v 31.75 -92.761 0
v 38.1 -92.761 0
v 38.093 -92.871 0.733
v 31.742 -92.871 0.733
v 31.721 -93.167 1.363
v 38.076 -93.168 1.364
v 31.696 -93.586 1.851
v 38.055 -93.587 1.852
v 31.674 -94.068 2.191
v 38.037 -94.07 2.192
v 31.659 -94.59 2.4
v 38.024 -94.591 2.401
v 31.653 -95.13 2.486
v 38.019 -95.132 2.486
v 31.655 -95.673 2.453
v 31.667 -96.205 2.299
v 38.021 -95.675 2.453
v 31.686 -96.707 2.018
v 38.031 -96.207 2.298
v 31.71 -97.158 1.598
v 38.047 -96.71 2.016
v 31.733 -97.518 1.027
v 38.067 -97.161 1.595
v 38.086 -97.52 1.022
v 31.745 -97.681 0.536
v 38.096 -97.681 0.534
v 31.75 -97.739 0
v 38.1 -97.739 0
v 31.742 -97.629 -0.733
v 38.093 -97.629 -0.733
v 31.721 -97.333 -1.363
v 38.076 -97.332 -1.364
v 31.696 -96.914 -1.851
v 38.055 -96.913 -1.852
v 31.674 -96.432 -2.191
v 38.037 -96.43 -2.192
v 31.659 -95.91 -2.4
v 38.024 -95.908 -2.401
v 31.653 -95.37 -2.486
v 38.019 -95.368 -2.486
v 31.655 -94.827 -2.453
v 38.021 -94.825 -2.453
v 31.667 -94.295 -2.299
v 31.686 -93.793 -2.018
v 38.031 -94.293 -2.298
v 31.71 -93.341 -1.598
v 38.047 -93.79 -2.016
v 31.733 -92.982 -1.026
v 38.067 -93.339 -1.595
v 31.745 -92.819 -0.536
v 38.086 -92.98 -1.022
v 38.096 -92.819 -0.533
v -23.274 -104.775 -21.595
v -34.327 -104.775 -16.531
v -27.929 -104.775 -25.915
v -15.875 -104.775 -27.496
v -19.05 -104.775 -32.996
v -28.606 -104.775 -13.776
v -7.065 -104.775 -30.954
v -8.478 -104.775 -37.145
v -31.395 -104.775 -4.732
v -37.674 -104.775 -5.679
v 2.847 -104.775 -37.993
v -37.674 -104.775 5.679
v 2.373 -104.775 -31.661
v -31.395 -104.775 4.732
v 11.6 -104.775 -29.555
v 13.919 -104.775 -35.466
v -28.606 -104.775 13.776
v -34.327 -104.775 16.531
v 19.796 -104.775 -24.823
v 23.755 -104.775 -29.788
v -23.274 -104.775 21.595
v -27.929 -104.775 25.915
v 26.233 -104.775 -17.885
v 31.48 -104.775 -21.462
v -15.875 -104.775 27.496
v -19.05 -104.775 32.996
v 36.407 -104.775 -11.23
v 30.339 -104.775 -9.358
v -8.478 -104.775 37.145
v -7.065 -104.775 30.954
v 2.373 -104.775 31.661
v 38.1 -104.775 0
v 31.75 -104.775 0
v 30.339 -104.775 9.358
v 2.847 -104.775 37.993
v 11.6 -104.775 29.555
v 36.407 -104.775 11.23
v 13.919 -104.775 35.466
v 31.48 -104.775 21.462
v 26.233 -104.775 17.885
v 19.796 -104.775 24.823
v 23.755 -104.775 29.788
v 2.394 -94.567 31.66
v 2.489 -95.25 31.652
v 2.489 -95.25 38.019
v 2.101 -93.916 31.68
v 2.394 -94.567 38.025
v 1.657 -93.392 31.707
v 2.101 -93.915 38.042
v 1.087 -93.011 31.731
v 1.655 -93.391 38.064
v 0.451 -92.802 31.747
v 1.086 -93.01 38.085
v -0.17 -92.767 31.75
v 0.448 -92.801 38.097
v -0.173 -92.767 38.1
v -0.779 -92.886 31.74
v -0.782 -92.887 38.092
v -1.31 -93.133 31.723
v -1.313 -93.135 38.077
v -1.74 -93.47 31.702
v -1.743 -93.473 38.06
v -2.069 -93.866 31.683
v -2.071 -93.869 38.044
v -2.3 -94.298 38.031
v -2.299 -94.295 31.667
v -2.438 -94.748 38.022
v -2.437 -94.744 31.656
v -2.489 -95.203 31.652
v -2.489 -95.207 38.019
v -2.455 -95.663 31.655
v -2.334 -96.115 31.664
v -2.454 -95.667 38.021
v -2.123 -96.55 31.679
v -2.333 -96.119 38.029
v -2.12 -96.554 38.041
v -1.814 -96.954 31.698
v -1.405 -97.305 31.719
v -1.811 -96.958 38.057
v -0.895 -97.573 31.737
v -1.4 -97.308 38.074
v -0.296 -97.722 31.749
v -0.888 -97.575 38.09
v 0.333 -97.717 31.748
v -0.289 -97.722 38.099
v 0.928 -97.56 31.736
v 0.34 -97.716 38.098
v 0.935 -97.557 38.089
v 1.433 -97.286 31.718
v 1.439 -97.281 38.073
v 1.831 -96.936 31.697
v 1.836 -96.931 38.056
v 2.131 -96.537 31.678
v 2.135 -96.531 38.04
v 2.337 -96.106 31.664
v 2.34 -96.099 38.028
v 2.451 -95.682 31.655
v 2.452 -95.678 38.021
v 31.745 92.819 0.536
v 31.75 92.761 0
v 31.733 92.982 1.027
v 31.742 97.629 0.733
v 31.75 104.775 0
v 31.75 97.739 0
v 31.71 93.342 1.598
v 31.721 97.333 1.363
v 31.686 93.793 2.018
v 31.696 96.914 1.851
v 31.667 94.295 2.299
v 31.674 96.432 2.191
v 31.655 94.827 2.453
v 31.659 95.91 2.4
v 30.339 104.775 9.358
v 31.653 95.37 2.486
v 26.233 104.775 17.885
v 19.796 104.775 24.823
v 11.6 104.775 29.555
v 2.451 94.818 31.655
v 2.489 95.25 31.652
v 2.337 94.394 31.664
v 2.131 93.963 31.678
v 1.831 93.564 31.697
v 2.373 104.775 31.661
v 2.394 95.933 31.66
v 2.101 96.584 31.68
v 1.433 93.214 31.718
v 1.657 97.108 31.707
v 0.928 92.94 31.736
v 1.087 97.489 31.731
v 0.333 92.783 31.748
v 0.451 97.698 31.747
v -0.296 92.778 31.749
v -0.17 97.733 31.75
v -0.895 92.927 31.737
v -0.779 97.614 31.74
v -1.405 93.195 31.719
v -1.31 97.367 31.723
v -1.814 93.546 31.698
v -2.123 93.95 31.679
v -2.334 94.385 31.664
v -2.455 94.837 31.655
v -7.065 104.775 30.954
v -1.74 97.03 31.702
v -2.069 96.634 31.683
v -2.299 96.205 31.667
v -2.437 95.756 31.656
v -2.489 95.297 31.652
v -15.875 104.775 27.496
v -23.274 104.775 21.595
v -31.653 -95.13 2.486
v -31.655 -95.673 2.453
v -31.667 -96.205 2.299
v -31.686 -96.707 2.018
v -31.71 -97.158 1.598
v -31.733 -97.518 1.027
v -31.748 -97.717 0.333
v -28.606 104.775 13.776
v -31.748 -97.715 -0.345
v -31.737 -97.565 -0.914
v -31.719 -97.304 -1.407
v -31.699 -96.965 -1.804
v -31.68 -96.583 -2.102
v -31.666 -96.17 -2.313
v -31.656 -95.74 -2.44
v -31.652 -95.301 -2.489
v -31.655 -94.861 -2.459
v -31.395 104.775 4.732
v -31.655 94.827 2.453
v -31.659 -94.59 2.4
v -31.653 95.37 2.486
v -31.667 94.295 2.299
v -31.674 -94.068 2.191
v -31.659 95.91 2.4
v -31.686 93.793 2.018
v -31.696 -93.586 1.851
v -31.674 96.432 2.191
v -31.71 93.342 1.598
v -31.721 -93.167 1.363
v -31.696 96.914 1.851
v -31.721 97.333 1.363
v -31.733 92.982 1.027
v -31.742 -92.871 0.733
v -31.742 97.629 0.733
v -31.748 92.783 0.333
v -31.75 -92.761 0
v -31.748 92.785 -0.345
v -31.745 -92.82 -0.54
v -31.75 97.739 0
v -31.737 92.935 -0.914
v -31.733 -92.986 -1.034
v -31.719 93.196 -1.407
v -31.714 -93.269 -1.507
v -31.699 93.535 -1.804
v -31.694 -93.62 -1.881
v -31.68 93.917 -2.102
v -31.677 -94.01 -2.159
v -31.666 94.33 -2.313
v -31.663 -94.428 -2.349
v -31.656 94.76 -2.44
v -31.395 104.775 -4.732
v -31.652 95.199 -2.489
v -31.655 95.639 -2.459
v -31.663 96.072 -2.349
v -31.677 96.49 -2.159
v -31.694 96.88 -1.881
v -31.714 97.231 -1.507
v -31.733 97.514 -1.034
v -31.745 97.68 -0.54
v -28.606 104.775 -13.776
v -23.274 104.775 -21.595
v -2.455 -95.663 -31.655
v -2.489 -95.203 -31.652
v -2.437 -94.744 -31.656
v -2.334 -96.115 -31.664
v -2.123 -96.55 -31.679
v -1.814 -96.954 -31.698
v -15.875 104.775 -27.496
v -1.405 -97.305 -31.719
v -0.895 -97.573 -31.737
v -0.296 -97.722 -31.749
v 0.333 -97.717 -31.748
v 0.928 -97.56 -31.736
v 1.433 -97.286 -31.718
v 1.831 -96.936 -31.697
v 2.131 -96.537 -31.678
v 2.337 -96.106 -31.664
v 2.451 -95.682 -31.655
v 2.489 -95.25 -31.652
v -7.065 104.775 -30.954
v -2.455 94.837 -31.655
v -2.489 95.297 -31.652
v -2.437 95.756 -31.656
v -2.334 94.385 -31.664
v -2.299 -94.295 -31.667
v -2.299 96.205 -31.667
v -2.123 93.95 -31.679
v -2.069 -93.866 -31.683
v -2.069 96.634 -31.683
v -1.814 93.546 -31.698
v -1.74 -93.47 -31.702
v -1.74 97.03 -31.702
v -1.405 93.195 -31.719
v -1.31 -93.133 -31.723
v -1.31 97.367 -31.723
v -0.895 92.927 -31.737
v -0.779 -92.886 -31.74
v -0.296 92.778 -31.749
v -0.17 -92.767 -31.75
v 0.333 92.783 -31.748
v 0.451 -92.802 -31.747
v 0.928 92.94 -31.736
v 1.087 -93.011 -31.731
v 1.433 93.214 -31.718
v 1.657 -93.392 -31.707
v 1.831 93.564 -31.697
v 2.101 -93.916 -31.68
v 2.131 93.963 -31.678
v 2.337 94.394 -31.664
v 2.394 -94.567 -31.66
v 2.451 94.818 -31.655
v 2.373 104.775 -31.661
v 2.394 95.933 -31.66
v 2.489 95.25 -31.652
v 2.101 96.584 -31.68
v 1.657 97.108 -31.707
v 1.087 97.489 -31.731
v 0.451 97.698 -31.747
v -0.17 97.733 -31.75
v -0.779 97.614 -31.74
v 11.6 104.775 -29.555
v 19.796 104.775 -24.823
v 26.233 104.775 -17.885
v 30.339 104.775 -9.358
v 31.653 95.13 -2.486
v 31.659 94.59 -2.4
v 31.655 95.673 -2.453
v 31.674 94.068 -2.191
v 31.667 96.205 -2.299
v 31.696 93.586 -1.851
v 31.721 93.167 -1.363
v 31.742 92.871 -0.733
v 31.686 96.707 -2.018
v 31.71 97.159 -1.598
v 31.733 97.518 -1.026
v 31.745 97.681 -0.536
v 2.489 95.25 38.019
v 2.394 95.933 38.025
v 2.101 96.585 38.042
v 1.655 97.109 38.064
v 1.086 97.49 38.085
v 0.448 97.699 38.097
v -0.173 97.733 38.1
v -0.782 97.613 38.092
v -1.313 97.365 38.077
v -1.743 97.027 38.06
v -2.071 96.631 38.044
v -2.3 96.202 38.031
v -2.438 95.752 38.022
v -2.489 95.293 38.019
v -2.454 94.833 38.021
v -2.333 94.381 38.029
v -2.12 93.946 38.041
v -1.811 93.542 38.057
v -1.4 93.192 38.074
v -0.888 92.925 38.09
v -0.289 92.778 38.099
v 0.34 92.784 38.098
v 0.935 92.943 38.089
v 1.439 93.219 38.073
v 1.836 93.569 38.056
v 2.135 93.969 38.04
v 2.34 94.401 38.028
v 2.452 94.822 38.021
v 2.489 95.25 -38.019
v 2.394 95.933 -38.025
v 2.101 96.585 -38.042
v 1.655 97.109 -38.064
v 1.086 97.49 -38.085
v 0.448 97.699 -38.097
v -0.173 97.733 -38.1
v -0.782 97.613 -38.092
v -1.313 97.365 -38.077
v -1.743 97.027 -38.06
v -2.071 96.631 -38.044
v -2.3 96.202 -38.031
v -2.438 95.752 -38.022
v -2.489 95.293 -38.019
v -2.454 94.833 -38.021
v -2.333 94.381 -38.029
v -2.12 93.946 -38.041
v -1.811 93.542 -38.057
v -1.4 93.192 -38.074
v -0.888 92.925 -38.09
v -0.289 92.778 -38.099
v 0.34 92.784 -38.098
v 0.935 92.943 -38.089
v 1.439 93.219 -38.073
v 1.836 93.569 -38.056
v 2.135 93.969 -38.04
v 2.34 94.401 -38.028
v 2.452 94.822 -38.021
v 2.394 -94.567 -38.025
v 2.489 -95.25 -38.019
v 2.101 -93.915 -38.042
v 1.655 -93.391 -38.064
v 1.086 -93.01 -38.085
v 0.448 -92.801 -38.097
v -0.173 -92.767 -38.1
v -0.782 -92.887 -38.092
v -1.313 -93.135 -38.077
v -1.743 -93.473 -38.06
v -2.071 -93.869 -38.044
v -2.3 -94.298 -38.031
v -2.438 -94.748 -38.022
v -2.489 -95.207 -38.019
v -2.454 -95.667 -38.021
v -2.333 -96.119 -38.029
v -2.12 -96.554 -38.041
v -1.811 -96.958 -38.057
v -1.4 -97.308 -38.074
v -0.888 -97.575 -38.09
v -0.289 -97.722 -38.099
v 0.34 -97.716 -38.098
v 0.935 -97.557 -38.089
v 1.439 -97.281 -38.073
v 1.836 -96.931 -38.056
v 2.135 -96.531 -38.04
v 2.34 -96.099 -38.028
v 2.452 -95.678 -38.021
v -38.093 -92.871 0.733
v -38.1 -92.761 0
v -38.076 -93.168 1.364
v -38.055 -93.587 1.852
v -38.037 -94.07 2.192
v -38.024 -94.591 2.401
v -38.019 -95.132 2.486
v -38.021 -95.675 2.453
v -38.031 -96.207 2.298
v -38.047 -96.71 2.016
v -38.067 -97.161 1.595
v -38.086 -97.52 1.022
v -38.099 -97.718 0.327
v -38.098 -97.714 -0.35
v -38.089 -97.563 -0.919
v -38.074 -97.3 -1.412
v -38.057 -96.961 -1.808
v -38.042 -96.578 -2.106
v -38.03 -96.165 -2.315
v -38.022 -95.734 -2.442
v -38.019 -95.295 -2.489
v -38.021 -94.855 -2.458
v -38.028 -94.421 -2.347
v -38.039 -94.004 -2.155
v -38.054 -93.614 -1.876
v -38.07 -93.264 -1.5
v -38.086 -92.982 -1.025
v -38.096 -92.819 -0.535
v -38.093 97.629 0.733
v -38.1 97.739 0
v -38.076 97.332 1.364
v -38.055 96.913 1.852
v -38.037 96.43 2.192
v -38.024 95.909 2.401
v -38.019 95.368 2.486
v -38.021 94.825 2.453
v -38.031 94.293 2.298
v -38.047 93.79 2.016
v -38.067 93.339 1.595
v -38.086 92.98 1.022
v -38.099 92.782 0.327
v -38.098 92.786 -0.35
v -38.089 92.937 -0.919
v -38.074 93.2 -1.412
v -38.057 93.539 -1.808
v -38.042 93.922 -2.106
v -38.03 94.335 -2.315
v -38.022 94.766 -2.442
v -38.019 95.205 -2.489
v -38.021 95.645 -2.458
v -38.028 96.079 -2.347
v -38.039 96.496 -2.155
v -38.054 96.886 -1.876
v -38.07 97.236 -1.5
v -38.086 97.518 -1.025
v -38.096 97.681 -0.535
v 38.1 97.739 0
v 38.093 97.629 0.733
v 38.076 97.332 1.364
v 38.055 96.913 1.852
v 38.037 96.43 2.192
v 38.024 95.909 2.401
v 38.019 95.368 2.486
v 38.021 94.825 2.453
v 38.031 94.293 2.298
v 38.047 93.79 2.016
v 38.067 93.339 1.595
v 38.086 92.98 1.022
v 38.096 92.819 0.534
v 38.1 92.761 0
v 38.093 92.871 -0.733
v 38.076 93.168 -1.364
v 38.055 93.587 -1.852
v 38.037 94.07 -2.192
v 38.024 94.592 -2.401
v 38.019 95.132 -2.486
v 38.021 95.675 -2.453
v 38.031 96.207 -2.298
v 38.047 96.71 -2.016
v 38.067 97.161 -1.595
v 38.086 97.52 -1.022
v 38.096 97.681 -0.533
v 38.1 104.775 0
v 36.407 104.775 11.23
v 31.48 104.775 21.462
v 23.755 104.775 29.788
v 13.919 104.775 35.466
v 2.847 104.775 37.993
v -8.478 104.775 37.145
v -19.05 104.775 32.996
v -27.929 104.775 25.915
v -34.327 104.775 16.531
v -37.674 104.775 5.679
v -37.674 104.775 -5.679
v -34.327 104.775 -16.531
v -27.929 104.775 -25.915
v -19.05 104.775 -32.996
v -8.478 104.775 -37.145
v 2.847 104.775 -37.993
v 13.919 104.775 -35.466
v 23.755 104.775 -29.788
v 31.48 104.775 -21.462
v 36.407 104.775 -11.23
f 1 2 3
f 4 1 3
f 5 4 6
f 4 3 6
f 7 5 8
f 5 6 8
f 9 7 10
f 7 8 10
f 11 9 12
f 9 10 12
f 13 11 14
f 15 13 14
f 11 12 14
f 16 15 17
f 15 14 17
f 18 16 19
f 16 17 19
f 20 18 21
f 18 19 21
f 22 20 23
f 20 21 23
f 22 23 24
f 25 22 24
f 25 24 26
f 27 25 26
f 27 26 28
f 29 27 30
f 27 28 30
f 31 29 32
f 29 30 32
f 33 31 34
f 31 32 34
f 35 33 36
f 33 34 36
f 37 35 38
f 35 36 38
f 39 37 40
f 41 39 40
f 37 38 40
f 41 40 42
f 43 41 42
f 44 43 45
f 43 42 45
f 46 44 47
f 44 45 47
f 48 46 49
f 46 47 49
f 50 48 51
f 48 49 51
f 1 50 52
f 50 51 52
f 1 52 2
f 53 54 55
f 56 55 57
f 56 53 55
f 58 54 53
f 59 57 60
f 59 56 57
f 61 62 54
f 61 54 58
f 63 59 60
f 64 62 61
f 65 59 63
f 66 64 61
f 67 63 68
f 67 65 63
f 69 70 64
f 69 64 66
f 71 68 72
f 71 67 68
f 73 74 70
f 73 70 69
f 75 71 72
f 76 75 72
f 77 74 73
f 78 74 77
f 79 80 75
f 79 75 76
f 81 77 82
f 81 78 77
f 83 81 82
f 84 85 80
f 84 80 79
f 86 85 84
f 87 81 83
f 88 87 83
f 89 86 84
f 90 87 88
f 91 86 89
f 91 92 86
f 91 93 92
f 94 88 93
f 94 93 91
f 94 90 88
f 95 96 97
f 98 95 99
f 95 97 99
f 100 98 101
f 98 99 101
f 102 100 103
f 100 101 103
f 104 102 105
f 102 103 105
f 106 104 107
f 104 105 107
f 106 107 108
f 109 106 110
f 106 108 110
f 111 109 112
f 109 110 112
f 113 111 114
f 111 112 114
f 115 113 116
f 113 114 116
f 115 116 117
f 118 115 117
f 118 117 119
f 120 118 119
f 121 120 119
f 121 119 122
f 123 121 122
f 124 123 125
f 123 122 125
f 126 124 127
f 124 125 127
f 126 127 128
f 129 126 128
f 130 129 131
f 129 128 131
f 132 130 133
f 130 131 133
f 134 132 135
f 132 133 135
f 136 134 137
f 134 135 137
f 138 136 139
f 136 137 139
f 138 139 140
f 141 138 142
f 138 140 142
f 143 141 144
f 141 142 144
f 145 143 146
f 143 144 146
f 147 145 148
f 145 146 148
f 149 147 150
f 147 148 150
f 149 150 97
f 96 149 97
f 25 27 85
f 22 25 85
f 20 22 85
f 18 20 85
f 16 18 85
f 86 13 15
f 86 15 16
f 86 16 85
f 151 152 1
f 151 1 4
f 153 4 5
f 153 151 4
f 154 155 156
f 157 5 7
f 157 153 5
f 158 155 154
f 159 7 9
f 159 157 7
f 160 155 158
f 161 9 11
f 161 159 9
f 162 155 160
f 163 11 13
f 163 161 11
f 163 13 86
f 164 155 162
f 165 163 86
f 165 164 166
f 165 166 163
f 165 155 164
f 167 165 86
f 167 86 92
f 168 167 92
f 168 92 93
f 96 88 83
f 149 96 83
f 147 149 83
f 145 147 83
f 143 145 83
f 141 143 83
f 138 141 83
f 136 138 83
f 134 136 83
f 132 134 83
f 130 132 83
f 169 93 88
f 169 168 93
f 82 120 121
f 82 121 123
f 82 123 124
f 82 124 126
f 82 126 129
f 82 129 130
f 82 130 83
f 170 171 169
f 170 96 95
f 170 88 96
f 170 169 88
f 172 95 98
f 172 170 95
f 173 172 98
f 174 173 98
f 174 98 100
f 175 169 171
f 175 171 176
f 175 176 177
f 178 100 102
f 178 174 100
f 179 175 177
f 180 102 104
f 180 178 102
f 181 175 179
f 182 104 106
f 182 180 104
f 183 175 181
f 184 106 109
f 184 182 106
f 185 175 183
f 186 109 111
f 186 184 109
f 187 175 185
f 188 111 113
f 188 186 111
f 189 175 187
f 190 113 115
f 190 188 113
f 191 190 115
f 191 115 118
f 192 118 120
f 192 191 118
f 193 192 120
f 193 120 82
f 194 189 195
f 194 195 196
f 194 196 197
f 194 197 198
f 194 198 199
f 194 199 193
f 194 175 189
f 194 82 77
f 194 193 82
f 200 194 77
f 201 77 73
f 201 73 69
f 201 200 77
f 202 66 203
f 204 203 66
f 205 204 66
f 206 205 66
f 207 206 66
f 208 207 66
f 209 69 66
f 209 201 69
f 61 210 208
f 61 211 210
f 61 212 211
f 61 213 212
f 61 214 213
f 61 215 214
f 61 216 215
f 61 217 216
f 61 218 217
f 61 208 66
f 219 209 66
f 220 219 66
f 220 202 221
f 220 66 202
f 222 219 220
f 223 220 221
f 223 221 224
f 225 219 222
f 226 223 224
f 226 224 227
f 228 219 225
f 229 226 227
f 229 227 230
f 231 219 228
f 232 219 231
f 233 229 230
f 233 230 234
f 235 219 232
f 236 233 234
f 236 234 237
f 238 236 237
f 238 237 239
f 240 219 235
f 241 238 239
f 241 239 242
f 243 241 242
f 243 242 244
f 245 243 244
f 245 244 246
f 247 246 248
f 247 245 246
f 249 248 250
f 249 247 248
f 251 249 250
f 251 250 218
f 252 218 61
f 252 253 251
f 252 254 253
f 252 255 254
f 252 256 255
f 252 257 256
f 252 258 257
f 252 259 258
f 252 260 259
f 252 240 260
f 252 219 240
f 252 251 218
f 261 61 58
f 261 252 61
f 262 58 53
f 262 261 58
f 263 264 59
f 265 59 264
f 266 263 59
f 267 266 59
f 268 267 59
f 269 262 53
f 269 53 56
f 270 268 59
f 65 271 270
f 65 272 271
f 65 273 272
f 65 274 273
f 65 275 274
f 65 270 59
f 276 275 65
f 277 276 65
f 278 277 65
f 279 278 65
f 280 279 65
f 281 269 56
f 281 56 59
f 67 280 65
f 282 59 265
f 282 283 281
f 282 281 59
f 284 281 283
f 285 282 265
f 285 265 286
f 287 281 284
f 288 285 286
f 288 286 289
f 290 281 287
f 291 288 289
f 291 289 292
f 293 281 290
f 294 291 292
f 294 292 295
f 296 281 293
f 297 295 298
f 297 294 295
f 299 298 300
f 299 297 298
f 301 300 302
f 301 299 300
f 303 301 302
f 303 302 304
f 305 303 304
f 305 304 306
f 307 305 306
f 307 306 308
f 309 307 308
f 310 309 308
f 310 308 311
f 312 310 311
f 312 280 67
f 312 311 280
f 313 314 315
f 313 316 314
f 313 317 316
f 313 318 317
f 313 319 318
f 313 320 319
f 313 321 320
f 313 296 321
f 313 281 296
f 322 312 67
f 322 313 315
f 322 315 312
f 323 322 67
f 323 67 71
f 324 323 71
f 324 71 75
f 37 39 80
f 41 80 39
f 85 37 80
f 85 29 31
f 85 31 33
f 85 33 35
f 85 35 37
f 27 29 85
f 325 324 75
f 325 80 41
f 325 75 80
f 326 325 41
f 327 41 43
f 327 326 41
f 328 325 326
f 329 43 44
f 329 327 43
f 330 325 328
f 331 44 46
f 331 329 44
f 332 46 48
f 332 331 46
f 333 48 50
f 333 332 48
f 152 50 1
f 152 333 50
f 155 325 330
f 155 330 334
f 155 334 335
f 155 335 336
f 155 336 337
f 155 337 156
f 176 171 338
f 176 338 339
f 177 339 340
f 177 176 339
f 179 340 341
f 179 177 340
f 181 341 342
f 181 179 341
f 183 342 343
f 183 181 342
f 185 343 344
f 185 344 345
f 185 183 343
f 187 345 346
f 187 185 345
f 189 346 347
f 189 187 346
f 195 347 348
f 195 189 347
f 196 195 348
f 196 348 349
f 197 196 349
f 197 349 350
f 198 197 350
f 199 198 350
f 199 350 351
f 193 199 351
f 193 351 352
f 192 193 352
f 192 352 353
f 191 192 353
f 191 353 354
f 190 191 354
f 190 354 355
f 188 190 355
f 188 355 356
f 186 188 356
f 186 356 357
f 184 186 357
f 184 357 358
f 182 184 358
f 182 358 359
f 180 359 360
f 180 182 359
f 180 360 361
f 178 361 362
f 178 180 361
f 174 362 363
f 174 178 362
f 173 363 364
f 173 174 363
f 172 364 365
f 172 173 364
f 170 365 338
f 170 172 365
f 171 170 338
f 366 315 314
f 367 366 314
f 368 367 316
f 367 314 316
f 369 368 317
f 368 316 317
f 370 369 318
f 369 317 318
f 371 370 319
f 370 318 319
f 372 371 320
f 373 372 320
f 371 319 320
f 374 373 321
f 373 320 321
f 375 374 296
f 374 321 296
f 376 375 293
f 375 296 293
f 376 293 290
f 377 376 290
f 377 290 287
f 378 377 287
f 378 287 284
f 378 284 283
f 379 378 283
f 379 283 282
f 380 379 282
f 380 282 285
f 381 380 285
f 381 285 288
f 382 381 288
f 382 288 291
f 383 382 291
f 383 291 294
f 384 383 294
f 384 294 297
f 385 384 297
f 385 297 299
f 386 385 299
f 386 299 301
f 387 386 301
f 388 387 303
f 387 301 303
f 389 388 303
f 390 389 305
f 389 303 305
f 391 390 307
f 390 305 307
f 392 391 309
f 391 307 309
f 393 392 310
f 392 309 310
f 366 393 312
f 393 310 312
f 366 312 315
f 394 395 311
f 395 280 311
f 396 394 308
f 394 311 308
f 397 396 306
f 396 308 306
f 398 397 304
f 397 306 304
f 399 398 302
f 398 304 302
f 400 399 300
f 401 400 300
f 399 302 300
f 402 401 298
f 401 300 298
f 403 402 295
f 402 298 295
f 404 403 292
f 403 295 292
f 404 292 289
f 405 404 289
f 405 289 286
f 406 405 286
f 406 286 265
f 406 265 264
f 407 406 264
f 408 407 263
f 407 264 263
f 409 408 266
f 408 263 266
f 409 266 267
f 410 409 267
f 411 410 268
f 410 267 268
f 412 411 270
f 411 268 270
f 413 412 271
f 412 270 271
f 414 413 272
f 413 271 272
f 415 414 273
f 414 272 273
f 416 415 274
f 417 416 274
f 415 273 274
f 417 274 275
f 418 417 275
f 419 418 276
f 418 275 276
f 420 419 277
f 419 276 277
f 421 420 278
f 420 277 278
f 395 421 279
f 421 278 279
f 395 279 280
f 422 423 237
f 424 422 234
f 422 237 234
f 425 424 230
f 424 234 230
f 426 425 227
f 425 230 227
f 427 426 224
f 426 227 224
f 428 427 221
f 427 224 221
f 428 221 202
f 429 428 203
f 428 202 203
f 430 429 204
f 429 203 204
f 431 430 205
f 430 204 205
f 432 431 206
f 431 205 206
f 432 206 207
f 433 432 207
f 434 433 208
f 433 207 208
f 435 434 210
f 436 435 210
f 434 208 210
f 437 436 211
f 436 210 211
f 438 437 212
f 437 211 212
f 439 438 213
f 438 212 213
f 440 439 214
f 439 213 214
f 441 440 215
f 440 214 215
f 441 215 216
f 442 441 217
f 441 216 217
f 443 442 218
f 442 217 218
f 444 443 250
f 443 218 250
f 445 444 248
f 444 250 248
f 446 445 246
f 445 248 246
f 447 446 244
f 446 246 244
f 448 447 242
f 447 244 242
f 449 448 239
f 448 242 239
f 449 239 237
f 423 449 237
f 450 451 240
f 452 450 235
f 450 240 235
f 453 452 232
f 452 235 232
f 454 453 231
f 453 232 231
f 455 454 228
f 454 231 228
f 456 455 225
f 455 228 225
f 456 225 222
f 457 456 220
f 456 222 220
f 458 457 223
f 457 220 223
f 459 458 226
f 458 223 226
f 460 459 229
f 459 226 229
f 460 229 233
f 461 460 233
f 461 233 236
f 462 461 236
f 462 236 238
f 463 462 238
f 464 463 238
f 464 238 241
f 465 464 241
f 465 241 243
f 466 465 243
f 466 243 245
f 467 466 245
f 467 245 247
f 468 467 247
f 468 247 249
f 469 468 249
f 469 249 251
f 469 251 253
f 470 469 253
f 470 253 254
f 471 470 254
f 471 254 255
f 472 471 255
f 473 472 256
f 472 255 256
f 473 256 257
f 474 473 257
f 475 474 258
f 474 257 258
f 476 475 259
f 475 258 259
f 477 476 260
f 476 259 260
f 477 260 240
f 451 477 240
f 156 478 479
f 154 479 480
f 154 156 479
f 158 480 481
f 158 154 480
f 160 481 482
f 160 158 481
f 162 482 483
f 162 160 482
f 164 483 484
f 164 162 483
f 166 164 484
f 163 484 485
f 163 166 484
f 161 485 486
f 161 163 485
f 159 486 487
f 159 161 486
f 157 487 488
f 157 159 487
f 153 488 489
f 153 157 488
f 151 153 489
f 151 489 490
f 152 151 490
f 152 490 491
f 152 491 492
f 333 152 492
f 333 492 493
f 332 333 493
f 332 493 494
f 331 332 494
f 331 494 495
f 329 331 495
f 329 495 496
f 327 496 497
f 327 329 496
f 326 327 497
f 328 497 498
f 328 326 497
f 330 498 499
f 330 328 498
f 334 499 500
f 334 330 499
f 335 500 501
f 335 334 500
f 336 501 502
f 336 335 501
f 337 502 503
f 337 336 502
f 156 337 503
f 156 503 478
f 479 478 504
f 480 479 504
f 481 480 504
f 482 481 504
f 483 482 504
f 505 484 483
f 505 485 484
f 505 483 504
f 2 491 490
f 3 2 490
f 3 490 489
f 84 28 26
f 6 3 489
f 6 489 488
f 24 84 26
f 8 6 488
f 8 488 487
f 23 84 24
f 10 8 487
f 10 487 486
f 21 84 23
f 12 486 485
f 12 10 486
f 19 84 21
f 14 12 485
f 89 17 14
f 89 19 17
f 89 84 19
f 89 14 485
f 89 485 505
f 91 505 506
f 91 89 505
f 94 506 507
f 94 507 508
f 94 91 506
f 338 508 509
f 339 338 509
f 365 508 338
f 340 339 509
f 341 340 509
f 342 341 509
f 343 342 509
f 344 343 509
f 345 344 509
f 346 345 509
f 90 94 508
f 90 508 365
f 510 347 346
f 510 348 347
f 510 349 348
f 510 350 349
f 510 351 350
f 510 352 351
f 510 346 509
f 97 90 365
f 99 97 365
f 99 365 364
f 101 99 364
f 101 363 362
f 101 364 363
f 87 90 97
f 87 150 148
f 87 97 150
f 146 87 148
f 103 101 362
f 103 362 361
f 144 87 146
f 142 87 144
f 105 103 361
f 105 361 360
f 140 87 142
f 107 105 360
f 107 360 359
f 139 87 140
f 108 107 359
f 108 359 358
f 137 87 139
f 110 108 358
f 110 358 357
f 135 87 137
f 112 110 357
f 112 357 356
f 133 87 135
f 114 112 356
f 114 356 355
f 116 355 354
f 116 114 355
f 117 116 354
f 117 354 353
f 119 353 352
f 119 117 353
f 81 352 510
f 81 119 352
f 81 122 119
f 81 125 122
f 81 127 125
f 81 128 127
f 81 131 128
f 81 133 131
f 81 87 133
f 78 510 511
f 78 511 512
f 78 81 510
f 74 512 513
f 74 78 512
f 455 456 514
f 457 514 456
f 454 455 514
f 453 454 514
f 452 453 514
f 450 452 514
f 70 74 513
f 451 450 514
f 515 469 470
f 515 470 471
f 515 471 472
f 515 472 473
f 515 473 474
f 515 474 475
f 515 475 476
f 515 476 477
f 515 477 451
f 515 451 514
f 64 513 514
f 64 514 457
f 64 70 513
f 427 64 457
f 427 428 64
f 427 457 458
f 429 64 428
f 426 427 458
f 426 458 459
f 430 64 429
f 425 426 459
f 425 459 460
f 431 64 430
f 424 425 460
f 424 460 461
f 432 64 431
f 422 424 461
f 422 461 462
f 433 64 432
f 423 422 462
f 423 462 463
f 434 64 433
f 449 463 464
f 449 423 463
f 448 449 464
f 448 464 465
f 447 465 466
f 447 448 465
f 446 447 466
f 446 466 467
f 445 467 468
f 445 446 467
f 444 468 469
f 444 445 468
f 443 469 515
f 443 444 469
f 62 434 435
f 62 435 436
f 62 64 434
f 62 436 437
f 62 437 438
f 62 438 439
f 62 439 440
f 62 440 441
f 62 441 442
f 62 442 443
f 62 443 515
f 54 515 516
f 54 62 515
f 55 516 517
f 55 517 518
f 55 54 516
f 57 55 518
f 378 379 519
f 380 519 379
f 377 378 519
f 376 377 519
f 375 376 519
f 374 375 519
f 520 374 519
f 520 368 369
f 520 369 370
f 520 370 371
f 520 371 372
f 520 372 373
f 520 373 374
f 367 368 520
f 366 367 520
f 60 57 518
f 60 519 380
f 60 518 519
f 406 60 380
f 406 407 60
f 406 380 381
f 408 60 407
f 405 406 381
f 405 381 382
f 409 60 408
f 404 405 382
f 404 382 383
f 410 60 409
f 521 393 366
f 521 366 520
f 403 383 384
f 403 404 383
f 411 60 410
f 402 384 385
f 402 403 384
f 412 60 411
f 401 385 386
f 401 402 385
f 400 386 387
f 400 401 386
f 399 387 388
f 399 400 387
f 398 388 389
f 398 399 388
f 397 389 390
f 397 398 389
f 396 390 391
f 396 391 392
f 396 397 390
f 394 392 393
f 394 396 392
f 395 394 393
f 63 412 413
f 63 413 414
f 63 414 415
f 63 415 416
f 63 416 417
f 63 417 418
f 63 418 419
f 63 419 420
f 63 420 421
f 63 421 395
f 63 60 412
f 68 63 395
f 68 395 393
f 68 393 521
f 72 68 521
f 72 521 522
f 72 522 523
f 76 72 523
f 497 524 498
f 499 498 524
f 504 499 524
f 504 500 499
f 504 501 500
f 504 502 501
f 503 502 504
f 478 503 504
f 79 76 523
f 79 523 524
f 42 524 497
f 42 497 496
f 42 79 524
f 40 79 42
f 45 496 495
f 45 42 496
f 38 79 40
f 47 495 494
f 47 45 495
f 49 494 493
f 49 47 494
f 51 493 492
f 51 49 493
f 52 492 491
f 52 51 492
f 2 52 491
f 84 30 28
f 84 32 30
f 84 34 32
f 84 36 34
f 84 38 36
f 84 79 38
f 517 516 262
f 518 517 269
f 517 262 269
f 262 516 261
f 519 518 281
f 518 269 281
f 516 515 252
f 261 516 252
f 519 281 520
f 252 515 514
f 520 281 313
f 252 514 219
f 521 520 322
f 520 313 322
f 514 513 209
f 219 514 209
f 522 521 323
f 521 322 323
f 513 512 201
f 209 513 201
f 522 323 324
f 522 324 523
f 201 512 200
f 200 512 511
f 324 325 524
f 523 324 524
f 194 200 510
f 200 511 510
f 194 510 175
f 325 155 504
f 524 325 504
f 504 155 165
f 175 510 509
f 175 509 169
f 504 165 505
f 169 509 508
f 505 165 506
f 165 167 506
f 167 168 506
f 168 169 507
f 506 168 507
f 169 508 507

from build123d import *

# Parameters (mm, degrees)
F0_R     = 38.1
F0_R_2   = 31.750001
F1_DEPTH = 104.775
F2_R     = 2.4892
F3_DEPTH = 101.6
F4_R     = 2.4892
F5_DEPTH = 101.6


with BuildPart() as f1:
    # F0 (on Front) → F1 (new body, symmetric)
    with BuildSketch(Plane.XZ):
        Circle(F0_R)
        Circle(F0_R_2, mode=Mode.SUBTRACT)
    extrude(amount=F1_DEPTH, both=True)

    # F2 (on Right) → F3 (cut, symmetric)
    with BuildSketch(Plane.YZ):
        with Locations((95.25, 0)):
            Circle(F2_R)
        with Locations((-95.25, 0)):
            Circle(F2_R)
    extrude(amount=F3_DEPTH, both=True, mode=Mode.SUBTRACT)

    # F4 (on Top) → F5 (cut, symmetric)
    with BuildSketch(Plane.XY):
        with Locations((0, 95.25)):
            Circle(F4_R)
        with Locations((0, -95.25)):
            Circle(F4_R)
    extrude(amount=F5_DEPTH, both=True, mode=Mode.SUBTRACT)


solid = f1.part
